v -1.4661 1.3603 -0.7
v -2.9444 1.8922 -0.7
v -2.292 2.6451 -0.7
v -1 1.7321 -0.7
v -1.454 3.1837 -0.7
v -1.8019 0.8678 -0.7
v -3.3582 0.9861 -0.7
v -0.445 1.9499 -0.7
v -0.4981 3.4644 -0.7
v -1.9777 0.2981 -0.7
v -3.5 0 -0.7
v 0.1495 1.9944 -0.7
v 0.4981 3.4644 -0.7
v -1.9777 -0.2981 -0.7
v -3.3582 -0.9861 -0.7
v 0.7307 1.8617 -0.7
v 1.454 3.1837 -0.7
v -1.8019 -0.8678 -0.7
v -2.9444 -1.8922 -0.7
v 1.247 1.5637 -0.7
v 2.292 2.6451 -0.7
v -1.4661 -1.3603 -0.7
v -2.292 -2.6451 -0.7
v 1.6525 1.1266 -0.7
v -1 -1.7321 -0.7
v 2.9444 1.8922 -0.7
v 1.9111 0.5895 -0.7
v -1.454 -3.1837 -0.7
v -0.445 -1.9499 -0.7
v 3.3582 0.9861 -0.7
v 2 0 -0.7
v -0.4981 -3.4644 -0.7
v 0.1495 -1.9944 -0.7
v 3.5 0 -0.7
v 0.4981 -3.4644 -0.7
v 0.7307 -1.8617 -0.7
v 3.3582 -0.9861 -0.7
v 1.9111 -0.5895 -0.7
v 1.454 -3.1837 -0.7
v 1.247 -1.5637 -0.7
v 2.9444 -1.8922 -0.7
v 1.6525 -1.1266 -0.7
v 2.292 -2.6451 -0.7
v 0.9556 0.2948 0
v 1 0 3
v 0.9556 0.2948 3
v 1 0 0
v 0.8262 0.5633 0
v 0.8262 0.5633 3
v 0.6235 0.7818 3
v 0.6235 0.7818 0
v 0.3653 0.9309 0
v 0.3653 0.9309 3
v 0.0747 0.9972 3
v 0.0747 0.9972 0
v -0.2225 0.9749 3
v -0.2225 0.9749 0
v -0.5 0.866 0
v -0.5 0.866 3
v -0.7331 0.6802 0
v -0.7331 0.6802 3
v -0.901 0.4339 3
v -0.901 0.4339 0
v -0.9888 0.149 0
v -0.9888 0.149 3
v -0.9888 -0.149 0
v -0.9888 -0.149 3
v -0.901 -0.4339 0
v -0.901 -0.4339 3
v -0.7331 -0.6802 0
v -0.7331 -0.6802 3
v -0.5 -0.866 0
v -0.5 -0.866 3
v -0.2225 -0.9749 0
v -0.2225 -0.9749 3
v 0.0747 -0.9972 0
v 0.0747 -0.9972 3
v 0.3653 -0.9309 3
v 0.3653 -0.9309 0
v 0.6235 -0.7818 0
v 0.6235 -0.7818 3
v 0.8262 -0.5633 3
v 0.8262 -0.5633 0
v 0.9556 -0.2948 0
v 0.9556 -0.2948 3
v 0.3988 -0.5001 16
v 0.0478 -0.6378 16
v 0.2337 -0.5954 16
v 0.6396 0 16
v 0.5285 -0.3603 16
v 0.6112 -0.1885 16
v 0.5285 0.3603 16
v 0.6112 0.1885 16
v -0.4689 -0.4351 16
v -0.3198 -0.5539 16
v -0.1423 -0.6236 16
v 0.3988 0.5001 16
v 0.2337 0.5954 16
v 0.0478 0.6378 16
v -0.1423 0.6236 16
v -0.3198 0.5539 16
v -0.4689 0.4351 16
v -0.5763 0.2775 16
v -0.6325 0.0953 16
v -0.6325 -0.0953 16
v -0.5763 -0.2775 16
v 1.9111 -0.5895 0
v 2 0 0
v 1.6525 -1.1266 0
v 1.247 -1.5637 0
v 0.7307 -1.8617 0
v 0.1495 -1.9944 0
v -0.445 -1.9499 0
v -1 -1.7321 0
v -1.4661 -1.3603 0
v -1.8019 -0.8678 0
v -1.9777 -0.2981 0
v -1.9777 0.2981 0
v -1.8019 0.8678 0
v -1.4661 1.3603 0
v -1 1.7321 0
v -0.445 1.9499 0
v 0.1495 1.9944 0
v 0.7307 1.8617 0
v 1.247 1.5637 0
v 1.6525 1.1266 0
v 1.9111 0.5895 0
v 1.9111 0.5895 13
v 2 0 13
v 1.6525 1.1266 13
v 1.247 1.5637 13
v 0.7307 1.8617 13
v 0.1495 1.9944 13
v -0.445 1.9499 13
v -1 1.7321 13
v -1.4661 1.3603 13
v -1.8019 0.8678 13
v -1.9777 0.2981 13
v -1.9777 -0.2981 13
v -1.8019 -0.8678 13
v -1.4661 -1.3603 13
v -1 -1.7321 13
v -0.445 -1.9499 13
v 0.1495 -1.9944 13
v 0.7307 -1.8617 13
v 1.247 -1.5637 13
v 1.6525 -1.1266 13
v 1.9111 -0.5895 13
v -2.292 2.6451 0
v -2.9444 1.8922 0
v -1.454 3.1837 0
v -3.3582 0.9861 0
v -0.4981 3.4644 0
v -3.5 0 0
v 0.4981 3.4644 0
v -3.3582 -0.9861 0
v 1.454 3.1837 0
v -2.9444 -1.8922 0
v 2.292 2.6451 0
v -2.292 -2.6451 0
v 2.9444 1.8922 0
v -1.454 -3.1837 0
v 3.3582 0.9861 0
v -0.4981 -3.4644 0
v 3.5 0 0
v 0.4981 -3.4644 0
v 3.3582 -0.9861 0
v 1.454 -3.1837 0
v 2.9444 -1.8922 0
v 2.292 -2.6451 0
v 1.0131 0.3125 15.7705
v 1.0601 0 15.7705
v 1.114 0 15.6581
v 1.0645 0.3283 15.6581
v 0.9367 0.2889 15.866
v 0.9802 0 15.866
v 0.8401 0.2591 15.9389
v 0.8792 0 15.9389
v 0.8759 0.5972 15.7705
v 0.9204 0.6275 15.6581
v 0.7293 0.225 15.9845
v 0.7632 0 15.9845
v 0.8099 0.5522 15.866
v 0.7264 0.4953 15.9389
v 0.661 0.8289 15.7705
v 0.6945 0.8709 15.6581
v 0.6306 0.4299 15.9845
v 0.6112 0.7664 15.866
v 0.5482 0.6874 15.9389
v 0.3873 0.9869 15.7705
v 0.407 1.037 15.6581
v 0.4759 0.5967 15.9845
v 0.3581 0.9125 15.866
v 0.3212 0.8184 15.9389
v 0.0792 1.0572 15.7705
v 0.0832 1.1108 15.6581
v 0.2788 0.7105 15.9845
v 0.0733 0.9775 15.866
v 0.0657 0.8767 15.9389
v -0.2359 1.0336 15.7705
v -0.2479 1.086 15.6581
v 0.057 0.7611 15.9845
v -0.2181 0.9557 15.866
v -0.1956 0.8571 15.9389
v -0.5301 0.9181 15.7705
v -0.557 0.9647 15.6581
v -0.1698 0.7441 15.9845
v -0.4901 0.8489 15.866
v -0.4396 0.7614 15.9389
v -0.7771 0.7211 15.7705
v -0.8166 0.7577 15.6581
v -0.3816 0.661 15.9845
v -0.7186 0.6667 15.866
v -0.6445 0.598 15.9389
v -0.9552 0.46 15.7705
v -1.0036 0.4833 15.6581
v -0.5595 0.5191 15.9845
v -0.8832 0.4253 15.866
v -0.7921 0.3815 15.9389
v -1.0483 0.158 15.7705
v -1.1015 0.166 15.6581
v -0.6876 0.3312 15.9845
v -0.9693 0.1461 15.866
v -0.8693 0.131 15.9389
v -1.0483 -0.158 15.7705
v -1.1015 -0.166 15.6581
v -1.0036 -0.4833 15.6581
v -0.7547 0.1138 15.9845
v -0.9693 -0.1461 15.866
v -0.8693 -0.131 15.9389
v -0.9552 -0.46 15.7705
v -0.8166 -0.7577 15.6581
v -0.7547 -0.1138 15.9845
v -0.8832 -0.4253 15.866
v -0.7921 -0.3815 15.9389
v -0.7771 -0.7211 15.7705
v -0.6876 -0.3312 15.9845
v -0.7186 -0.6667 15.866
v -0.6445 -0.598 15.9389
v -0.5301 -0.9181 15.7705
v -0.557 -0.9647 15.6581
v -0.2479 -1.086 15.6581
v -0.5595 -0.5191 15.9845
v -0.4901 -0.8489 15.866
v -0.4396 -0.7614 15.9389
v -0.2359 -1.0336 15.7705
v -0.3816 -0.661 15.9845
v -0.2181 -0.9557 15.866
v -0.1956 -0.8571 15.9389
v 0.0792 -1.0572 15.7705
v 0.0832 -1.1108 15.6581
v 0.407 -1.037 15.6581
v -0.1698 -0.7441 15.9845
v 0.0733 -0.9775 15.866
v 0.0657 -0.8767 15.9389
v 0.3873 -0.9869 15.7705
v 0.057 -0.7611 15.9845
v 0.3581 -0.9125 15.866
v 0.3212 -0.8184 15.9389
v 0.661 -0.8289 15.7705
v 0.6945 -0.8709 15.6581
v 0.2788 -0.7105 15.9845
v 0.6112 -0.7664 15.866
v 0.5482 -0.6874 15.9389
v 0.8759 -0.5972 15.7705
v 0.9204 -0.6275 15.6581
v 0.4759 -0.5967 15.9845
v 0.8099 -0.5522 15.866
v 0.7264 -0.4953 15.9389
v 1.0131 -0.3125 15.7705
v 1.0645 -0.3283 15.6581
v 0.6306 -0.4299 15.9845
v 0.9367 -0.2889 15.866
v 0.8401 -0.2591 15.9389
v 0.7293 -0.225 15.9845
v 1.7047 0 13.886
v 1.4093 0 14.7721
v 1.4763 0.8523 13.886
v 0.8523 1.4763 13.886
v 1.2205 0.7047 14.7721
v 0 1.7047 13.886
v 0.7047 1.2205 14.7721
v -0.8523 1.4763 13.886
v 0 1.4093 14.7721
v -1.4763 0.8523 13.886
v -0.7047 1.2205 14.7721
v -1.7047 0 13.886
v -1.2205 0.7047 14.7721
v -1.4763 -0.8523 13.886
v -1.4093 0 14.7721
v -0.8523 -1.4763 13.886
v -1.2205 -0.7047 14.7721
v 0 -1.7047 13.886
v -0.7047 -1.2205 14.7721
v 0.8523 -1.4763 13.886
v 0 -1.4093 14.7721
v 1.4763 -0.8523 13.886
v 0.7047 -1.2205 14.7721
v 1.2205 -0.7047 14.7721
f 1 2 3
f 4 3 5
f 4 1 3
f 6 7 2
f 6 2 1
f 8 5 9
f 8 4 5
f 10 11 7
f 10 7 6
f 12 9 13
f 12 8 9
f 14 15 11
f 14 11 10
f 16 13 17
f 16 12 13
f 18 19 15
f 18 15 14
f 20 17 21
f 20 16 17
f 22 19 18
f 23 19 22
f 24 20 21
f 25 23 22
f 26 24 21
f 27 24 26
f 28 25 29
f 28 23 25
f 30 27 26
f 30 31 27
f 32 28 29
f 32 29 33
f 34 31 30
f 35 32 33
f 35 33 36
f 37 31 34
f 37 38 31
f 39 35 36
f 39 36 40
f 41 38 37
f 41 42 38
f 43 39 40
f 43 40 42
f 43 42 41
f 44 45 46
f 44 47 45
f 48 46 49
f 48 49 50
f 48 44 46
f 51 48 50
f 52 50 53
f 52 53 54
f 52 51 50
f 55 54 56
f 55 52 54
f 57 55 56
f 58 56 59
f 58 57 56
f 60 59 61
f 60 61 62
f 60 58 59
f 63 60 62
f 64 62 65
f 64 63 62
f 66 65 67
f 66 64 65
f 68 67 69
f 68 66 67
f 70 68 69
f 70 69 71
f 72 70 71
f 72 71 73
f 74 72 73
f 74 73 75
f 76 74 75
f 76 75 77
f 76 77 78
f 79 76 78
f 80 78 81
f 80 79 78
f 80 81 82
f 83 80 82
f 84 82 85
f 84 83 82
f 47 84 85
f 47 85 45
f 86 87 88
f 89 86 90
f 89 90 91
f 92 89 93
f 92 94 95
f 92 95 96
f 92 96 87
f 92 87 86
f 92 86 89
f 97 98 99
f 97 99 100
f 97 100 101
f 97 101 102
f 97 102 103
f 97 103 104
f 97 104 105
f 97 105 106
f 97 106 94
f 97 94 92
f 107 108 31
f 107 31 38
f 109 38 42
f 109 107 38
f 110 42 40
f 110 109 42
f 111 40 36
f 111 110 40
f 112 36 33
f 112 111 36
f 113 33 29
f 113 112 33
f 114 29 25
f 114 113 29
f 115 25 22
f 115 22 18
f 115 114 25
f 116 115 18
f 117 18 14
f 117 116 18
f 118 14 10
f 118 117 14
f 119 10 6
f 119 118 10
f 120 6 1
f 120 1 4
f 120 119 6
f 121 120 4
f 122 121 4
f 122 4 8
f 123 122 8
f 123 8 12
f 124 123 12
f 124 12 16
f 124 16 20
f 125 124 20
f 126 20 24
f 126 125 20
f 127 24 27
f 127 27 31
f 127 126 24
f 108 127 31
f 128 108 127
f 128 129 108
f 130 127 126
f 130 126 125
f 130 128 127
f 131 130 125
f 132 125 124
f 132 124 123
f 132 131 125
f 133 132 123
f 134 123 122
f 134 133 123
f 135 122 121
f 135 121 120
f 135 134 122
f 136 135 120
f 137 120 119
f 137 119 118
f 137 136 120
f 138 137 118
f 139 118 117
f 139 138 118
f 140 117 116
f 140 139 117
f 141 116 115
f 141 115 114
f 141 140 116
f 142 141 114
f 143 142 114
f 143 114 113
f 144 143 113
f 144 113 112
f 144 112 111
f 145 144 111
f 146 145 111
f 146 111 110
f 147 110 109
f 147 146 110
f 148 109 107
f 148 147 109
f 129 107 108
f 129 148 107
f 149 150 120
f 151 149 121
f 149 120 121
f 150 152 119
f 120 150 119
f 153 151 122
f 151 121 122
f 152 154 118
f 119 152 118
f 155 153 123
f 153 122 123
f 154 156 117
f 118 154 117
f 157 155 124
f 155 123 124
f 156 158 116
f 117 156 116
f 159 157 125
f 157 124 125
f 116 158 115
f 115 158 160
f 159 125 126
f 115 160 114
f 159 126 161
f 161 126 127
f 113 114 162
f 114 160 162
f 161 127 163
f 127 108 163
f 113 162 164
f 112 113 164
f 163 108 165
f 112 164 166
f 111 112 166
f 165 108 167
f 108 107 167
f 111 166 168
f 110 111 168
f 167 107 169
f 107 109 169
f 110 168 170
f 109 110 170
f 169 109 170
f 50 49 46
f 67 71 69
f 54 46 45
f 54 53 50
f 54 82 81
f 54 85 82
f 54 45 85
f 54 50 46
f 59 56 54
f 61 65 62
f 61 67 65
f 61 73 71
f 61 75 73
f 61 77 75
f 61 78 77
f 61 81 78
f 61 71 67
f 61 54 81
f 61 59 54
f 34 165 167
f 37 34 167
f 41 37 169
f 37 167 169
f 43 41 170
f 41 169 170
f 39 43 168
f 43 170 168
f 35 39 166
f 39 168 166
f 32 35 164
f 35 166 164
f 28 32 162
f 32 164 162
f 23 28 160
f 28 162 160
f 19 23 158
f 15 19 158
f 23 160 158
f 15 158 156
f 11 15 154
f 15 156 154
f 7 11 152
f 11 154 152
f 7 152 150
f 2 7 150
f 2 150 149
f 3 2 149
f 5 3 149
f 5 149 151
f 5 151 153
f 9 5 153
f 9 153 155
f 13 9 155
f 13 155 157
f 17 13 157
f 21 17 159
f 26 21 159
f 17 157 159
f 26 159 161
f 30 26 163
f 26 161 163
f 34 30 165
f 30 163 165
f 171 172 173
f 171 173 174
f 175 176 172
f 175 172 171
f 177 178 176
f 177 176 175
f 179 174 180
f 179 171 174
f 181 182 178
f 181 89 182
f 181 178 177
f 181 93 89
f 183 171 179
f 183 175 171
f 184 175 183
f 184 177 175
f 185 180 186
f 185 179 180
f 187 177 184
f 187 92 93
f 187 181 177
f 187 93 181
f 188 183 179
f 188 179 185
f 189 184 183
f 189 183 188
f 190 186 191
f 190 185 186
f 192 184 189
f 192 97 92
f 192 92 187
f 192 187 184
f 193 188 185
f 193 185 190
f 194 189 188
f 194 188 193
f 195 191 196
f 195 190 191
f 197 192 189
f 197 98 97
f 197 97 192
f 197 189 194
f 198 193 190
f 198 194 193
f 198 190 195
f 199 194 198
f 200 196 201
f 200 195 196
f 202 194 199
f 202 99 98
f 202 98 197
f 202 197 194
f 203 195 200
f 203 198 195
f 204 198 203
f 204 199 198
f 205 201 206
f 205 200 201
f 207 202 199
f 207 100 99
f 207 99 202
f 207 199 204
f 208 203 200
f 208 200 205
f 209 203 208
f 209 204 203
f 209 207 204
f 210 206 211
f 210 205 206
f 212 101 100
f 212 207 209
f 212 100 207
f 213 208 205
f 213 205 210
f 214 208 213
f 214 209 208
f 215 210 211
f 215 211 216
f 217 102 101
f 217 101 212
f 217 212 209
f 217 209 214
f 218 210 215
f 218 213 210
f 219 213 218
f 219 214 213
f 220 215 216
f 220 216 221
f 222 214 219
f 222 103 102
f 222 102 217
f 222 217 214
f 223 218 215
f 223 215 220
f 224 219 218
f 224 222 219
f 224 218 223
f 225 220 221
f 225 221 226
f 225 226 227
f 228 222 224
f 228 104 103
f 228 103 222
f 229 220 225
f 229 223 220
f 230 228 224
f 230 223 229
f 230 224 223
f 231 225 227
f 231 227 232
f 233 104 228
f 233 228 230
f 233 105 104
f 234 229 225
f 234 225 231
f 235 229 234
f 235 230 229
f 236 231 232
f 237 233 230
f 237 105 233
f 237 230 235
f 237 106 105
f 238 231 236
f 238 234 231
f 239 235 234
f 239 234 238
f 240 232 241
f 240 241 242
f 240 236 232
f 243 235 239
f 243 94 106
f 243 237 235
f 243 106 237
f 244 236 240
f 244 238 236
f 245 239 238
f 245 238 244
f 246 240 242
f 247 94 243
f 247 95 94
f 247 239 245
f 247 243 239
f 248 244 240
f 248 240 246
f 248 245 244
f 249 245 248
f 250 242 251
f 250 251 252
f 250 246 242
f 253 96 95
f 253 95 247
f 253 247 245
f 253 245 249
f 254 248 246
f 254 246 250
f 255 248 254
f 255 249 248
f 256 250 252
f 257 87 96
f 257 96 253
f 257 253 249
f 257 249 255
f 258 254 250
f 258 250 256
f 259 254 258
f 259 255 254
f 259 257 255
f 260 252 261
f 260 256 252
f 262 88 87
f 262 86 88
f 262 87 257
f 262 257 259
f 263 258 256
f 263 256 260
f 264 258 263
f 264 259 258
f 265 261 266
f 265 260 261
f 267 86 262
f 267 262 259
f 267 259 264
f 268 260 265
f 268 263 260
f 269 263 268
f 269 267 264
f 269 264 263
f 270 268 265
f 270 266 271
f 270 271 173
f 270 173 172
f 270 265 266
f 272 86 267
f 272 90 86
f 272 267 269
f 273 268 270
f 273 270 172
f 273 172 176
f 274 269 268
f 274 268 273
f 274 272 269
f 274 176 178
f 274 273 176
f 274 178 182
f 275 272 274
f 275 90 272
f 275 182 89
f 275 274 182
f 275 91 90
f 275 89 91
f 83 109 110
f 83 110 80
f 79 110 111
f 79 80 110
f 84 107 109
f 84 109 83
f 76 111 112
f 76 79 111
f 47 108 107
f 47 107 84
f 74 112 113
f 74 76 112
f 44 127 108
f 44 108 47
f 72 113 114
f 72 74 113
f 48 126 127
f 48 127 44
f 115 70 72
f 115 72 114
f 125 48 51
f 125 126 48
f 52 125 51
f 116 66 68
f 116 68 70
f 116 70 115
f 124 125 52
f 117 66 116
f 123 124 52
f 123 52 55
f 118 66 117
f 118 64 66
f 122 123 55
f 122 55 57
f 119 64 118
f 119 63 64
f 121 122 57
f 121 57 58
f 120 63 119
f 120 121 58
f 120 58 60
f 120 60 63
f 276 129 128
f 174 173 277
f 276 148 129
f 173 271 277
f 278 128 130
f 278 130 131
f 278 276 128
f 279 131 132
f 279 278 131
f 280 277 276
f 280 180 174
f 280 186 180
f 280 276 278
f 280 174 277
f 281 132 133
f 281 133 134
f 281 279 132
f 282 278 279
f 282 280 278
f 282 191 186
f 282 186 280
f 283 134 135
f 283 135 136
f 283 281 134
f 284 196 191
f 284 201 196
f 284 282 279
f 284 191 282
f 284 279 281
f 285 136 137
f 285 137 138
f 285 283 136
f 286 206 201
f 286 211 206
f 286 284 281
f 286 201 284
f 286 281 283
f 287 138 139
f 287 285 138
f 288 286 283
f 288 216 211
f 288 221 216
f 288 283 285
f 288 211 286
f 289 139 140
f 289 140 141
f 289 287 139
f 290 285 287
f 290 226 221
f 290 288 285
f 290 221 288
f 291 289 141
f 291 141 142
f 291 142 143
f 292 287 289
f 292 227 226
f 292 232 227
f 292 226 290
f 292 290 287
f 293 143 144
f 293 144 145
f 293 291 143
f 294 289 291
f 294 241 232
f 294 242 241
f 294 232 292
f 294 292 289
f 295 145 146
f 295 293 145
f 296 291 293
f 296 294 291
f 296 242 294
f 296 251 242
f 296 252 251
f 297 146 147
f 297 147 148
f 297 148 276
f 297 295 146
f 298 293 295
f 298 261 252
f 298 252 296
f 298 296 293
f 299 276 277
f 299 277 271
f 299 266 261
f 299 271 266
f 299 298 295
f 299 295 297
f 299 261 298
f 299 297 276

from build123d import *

# Parameters (mm, degrees)
F2_R     = 3.5
F2_R_2   = 2
F3_DEPTH = 0.7
F4_R     = 0.5


with BuildPart() as f1:
    # F0 (on Front) → F1 (revolve)
    with BuildSketch(Plane.XZ):
        Polygon((0, 16), (0, 3), (1, 3), (1, 0), (2, 0), (2, 13), (1, 16), align=None)
    revolve(axis=Axis((0, 0, 8), (0, 0, 1)))

    # F4
    f4_edges = [f1.edges().sort_by_distance(p)[0] for p in [
        (-1, 0, 16),
    ]]
    fillet(f4_edges, radius=F4_R)


with BuildPart() as f3:
    # F2 (on face) → F3 (new body)
    with BuildSketch(Plane(origin=(0, 0, 0), x_dir=(1, 0, 0), z_dir=(0, 0, -1))):
        Circle(F2_R)
        Circle(F2_R_2, mode=Mode.SUBTRACT)
    extrude(amount=F3_DEPTH)


solid = Compound([f1.part, f3.part])
